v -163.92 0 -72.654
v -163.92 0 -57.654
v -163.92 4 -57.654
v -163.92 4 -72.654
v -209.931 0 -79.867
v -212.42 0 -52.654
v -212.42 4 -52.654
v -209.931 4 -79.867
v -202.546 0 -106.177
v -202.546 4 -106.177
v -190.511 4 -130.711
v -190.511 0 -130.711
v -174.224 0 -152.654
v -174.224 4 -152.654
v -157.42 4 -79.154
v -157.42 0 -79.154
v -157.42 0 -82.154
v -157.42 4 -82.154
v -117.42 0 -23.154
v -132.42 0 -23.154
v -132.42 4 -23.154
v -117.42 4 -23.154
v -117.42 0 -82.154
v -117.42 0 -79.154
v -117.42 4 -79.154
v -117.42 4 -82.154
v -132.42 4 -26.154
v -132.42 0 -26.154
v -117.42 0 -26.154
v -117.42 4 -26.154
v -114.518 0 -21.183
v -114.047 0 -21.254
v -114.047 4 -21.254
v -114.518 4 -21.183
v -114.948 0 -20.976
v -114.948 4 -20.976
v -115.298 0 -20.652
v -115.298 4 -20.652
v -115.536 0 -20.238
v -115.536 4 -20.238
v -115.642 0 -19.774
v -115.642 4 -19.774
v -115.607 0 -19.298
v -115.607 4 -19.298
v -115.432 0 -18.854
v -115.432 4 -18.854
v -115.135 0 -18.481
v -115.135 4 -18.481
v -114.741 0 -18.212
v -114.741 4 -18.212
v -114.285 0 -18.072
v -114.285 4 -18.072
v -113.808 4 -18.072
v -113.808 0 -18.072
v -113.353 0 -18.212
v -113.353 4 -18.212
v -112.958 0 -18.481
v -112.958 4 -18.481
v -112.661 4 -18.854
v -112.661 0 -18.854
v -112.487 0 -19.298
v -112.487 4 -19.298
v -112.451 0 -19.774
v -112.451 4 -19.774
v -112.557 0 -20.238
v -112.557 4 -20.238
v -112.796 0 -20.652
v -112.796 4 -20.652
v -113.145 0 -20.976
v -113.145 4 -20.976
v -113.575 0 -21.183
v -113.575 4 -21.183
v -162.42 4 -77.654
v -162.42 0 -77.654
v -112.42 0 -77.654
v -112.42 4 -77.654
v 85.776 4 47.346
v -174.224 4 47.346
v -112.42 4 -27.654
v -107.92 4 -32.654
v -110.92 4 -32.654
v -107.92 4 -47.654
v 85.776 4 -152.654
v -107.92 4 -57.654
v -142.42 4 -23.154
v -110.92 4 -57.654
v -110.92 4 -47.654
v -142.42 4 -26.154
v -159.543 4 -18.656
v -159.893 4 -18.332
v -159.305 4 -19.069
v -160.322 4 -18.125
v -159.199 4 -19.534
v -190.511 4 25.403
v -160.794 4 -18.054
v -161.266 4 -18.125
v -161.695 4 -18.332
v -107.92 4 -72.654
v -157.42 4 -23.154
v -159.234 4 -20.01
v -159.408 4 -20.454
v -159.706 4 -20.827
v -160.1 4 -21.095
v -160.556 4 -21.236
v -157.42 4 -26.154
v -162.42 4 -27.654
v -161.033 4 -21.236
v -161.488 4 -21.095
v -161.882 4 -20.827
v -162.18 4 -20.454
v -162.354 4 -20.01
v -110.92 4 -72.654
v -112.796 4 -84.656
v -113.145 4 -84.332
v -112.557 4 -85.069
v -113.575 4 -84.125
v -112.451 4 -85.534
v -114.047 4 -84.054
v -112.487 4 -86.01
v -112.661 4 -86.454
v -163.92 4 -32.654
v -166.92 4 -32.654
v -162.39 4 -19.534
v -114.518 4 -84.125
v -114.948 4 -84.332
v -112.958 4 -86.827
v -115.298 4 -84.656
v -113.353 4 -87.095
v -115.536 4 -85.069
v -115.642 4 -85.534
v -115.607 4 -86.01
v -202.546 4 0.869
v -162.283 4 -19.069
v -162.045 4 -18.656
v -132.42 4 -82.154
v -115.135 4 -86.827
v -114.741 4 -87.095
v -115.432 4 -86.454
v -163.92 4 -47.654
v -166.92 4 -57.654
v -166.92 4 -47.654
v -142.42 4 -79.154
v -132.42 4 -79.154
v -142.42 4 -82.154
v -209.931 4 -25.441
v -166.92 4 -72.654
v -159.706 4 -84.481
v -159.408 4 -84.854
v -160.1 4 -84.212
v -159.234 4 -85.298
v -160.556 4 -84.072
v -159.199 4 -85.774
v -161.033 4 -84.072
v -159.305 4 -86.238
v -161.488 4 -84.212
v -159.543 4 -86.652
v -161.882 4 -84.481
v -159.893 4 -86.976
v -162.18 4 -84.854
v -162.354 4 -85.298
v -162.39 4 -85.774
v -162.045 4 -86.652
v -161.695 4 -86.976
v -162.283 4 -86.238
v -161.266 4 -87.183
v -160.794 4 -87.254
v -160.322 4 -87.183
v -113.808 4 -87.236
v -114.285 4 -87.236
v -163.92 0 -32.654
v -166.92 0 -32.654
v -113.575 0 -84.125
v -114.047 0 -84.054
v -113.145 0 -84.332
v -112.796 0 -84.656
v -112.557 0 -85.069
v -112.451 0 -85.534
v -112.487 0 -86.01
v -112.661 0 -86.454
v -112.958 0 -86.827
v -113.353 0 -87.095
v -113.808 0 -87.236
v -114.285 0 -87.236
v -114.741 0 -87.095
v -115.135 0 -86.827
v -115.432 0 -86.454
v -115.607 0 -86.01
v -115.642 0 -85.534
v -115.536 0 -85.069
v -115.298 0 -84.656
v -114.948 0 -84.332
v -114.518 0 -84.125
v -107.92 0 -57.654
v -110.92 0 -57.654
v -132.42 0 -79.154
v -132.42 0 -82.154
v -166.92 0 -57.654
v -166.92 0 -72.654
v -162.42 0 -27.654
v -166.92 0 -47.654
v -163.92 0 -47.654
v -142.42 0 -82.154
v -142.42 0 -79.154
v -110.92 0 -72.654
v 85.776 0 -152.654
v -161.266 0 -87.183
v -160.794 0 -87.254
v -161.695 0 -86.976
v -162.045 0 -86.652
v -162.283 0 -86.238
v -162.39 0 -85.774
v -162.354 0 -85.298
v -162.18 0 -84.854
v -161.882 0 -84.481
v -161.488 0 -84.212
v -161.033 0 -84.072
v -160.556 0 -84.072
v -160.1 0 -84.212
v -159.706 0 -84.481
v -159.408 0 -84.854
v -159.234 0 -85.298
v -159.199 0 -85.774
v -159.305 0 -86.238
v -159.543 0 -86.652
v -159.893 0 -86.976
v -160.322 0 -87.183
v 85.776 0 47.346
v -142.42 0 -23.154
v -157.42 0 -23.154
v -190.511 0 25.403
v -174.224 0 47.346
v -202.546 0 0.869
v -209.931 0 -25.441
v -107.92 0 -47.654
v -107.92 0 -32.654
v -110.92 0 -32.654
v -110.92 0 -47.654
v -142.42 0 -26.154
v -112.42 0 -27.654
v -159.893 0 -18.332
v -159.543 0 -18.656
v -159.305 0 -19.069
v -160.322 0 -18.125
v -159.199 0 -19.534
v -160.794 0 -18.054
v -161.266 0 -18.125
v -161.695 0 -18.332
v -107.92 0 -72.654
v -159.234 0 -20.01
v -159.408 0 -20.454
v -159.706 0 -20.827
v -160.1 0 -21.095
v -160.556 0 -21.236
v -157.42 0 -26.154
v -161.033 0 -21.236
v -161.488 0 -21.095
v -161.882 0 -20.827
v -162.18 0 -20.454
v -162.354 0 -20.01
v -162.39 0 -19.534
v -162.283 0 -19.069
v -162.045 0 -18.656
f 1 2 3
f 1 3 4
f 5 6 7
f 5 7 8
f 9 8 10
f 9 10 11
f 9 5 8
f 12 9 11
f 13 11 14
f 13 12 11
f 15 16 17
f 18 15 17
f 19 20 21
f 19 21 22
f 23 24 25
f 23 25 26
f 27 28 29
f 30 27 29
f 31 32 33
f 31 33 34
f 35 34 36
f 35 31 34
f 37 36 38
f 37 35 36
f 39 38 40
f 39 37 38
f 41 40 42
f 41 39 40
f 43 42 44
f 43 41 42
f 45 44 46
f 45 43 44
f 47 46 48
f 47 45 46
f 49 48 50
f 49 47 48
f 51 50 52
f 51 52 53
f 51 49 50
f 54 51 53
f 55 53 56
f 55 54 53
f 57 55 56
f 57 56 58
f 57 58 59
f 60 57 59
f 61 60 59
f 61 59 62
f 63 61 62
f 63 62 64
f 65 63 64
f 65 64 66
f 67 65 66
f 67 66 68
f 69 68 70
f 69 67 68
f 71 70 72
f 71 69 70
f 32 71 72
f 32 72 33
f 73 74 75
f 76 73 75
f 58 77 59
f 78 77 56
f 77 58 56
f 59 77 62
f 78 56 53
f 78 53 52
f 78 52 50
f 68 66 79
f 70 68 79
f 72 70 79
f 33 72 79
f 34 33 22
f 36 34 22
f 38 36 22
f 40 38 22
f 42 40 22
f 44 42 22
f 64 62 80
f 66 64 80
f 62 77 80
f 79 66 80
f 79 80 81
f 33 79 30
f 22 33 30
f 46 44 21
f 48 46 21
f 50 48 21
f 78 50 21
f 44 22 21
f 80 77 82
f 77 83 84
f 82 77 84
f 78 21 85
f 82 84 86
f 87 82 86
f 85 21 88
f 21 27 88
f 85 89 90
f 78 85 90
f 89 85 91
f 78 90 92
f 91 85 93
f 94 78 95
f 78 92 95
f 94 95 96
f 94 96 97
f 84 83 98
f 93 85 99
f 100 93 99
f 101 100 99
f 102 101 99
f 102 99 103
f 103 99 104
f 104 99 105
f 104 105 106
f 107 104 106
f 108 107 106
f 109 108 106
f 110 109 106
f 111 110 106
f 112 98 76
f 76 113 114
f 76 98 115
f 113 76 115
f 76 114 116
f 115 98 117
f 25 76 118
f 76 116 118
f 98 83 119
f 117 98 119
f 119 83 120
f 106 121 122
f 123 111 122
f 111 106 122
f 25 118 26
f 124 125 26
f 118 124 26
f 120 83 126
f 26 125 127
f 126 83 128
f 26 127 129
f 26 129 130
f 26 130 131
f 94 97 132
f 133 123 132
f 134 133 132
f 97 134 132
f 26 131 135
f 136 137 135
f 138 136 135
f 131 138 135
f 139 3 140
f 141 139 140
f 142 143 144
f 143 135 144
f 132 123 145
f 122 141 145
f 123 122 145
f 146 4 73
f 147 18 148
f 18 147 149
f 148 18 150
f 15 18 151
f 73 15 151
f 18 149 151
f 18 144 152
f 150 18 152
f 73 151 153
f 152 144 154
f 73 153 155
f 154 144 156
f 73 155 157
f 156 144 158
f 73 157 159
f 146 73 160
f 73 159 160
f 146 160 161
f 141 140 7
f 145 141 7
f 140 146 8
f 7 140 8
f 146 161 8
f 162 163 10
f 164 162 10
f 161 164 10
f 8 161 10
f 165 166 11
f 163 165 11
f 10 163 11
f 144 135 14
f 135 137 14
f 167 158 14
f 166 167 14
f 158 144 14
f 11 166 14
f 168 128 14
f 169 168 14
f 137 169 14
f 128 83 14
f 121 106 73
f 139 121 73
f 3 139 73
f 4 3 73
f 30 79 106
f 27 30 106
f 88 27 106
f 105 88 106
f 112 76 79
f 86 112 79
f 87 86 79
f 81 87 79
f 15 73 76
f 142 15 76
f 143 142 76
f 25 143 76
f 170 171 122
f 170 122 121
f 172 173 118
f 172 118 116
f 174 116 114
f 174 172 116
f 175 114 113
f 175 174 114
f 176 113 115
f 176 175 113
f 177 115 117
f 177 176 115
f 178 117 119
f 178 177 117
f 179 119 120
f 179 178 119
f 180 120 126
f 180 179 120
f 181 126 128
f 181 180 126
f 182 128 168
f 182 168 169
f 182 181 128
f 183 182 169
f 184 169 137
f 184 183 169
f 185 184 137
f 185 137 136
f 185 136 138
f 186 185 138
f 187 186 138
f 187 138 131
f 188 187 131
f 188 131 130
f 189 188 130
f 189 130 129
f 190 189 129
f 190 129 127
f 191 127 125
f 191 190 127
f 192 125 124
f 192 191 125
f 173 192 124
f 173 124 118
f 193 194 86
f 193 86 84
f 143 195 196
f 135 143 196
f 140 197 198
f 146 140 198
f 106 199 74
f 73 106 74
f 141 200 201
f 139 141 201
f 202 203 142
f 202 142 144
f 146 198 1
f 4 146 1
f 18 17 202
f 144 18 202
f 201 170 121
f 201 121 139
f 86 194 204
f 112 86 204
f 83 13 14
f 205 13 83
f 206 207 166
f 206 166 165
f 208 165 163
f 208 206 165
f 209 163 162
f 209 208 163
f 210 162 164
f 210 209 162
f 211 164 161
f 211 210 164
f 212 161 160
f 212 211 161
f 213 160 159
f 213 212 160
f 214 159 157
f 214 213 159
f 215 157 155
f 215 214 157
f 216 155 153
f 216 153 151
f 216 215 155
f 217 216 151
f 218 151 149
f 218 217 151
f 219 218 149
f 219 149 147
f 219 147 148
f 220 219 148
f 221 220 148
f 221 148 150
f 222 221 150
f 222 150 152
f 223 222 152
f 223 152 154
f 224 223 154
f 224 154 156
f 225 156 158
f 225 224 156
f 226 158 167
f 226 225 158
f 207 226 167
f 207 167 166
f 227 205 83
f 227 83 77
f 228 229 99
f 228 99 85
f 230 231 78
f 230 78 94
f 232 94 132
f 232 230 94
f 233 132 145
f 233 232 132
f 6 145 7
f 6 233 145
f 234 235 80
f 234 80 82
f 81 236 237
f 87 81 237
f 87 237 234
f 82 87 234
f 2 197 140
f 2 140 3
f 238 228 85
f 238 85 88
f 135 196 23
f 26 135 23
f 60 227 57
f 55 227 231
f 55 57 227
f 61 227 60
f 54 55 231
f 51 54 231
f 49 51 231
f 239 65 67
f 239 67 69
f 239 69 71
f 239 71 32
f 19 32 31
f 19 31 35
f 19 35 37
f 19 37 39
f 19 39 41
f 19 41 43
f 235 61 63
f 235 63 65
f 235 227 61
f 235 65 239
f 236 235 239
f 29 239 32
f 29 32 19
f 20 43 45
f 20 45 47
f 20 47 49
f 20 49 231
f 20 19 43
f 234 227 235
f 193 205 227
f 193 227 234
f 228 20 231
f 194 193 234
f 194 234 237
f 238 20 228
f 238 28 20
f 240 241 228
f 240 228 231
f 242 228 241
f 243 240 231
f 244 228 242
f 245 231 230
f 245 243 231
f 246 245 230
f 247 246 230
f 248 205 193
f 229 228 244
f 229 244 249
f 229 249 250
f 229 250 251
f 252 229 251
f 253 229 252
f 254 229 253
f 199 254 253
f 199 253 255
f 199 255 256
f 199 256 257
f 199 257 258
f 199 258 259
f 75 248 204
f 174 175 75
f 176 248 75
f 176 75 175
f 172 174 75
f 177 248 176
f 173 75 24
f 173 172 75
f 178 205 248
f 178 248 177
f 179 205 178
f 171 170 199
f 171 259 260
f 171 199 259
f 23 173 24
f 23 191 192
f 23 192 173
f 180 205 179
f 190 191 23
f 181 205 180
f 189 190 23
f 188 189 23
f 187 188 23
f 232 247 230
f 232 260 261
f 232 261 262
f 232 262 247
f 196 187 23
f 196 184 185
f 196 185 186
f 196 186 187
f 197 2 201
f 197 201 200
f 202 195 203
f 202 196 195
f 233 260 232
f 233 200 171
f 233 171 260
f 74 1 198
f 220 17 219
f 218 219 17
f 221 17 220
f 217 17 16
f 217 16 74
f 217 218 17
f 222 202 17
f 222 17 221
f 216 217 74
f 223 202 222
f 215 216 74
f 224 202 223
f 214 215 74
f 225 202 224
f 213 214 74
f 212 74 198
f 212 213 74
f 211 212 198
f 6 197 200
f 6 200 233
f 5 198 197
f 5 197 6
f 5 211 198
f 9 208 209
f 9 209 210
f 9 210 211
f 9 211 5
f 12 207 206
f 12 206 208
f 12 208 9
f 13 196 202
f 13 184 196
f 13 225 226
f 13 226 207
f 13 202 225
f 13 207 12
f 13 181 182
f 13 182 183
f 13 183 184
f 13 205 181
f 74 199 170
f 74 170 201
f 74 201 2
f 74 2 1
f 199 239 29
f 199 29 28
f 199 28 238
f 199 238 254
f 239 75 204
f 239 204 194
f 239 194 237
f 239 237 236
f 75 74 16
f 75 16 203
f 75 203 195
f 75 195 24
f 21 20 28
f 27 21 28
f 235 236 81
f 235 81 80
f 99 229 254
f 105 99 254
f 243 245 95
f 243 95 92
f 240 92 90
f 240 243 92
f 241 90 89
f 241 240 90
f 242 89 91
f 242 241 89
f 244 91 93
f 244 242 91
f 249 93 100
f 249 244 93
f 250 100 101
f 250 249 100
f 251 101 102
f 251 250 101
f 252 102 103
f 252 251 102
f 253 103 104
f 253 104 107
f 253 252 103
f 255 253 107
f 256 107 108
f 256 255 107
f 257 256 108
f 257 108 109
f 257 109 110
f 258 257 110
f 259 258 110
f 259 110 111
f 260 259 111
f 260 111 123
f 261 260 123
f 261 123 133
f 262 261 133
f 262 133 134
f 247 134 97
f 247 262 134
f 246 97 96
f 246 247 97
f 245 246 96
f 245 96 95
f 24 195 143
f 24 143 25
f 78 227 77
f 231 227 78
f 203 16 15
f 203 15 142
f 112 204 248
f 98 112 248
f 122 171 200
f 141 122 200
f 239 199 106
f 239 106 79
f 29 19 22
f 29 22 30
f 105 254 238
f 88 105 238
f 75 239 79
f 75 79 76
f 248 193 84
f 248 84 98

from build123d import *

# Parameters (mm, degrees)
SKETCH1_R           = 1.6
SKETCH1_W           = 50
SKETCH1_H           = 50
SKETCH1_W_2         = 15
SKETCH1_H_2         = 3
SKETCH1_W_3         = 3
SKETCH1_H_3         = 15
BOSS_EXTRUDE1_DEPTH = 4


with BuildPart() as part:
    # Sketch1 → Boss-Extrude1 (new body)
    with BuildSketch(Plane(origin=(37.559096252, 0, 0), x_dir=(1, 0, 0), z_dir=(0, 1, 0))):
        with BuildLine():
            Line((48.217114977, 152.653937947), (48.217114977, -47.346062053))
            Line((48.217114977, -47.346062053), (-211.782885023, -47.346062053))
            ThreePointArc((-211.782885023, -47.346062053), (-240.105339993, -0.869375518), (-249.979486148, 52.653937947))
            ThreePointArc((-249.979486148, 52.653937947), (-240.105339993, 106.177251413), (-211.782885023, 152.653937947))
            Line((-211.782885023, 152.653937947), (48.217114977, 152.653937947))
        make_face()
        with Locations(Location((-198.353137603, 19.653937947, 0), (0, 0, 270))):
            Circle(SKETCH1_R, mode=Mode.SUBTRACT)
        with Locations(Location((-151.605834694, 19.653937947, 0), (0, 0, 90))):
            Circle(SKETCH1_R, mode=Mode.SUBTRACT)
        with Locations(Location((-198.353137603, 85.653937947, 0), (0, 0, 90))):
            Circle(SKETCH1_R, mode=Mode.SUBTRACT)
        with Locations(Location((-151.605834694, 85.653937947, 0), (0, 0, 270))):
            Circle(SKETCH1_R, mode=Mode.SUBTRACT)
        with Locations((-174.979486148, 52.653937947)):
            Rectangle(SKETCH1_W, SKETCH1_H, mode=Mode.SUBTRACT)
        with Locations((-187.479486148, 80.653937947)):
            Rectangle(SKETCH1_W_2, SKETCH1_H_2, mode=Mode.SUBTRACT)
        with Locations((-187.479486148, 24.653937947)):
            Rectangle(SKETCH1_W_2, SKETCH1_H_2, mode=Mode.SUBTRACT)
        with Locations((-162.479486148, 24.653937947)):
            Rectangle(SKETCH1_W_2, SKETCH1_H_2, mode=Mode.SUBTRACT)
        with Locations((-162.479486148, 80.653937947)):
            Rectangle(SKETCH1_W_2, SKETCH1_H_2, mode=Mode.SUBTRACT)
        with Locations((-146.979486148, 40.153937947)):
            Rectangle(SKETCH1_W_3, SKETCH1_H_3, mode=Mode.SUBTRACT)
        with Locations((-146.979486148, 65.153937947)):
            Rectangle(SKETCH1_W_3, SKETCH1_H_3, mode=Mode.SUBTRACT)
        with Locations((-202.979486148, 40.153937947)):
            Rectangle(SKETCH1_W_3, SKETCH1_H_3, mode=Mode.SUBTRACT)
        with Locations((-202.979486148, 65.153937947)):
            Rectangle(SKETCH1_W_3, SKETCH1_H_3, mode=Mode.SUBTRACT)
    extrude(amount=BOSS_EXTRUDE1_DEPTH)


solid = part.part
